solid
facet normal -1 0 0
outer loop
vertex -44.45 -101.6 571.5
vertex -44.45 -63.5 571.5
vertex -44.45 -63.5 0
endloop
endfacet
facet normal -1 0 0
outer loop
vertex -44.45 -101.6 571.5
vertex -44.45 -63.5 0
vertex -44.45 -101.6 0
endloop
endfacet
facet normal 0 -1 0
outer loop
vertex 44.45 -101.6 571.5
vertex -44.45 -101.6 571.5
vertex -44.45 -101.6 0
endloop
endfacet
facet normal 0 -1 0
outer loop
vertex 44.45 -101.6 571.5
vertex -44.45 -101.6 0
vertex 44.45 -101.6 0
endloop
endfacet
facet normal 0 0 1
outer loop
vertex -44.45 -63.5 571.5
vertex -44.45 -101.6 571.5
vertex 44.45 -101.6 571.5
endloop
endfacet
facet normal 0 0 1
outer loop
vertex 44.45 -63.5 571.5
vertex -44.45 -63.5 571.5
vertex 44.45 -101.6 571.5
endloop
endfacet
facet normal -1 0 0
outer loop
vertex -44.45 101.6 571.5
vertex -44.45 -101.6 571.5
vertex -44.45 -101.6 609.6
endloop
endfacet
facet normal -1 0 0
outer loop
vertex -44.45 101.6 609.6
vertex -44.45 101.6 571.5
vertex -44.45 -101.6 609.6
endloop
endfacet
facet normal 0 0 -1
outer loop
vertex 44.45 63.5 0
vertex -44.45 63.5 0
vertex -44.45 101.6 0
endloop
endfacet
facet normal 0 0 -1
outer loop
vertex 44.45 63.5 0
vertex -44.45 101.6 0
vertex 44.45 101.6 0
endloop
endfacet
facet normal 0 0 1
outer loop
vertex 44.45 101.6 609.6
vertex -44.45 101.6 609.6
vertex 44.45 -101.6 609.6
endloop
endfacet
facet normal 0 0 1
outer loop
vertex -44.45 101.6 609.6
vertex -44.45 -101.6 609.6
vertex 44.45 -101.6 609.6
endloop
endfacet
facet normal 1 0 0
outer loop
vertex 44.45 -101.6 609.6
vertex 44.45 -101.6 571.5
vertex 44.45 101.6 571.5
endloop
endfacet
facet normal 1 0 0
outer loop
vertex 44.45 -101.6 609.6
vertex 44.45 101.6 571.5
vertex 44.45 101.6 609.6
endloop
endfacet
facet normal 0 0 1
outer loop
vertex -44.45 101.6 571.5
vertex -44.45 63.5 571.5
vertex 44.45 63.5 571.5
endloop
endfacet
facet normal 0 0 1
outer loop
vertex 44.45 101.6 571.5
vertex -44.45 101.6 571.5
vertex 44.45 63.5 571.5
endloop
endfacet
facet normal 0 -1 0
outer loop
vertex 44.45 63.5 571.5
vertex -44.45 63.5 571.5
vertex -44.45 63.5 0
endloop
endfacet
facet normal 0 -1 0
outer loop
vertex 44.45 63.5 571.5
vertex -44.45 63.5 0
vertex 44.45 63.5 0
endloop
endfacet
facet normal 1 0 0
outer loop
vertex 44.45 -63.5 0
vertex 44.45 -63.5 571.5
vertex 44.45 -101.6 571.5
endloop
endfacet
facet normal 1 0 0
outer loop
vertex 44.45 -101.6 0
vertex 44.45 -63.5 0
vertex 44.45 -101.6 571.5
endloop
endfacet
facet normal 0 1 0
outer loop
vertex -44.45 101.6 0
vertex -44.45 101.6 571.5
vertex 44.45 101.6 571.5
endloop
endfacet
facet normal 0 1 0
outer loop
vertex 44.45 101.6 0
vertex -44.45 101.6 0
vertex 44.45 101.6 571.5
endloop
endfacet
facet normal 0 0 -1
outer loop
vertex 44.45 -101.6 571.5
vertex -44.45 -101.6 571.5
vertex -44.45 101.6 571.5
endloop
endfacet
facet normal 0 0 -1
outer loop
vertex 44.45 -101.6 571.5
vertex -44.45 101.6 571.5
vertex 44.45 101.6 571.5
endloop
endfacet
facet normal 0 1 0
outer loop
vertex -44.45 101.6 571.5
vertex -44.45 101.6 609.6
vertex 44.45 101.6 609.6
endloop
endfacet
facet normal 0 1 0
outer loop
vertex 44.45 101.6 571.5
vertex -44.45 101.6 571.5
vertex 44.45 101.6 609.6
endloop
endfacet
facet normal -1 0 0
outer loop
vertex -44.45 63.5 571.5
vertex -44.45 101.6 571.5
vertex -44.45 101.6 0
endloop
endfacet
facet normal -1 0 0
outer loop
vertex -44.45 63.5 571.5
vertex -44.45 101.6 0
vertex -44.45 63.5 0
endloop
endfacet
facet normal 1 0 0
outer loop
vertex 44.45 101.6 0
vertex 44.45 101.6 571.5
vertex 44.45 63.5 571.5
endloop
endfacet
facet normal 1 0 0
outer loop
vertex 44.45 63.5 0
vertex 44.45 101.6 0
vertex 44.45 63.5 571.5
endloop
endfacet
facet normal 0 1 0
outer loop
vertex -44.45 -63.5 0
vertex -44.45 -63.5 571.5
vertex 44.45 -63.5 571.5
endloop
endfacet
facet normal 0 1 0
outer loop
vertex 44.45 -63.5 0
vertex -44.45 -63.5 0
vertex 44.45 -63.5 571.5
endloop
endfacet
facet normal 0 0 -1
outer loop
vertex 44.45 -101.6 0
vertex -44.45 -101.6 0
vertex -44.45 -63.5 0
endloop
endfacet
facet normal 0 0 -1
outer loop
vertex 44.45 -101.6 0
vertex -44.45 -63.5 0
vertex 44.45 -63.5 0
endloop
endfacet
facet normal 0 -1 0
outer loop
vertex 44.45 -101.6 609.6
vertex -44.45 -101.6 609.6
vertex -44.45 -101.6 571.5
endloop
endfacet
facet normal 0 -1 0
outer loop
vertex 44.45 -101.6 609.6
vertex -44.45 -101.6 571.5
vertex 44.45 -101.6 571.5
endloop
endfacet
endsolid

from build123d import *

# Parameters (mm, degrees)
F0_W     = 88.9
F0_H     = 38.1
F1_DEPTH = 101.6
F2_W     = 88.9
F2_H     = 38.1
F3_DEPTH = 571.5


with BuildPart() as f1:
    # F0 (on Front) → F1 (new body, symmetric)
    with BuildSketch(Plane.XZ):
        with Locations((0, 590.55)):
            Rectangle(F0_W, F0_H)
    extrude(amount=F1_DEPTH, both=True)


with BuildPart() as f3:
    # F2 (on face) → F3 (new body, through all)
    with BuildSketch(Plane(origin=(0, 0, 571.5), x_dir=(1, 0, 0), z_dir=(0, 0, -1))):
        with Locations((0, -82.55)):
            Rectangle(F2_W, F2_H)
        with Locations((0, 82.55)):
            Rectangle(F2_W, F2_H)
    extrude(amount=F3_DEPTH)


solid = Compound([f1.part, f3.part])
